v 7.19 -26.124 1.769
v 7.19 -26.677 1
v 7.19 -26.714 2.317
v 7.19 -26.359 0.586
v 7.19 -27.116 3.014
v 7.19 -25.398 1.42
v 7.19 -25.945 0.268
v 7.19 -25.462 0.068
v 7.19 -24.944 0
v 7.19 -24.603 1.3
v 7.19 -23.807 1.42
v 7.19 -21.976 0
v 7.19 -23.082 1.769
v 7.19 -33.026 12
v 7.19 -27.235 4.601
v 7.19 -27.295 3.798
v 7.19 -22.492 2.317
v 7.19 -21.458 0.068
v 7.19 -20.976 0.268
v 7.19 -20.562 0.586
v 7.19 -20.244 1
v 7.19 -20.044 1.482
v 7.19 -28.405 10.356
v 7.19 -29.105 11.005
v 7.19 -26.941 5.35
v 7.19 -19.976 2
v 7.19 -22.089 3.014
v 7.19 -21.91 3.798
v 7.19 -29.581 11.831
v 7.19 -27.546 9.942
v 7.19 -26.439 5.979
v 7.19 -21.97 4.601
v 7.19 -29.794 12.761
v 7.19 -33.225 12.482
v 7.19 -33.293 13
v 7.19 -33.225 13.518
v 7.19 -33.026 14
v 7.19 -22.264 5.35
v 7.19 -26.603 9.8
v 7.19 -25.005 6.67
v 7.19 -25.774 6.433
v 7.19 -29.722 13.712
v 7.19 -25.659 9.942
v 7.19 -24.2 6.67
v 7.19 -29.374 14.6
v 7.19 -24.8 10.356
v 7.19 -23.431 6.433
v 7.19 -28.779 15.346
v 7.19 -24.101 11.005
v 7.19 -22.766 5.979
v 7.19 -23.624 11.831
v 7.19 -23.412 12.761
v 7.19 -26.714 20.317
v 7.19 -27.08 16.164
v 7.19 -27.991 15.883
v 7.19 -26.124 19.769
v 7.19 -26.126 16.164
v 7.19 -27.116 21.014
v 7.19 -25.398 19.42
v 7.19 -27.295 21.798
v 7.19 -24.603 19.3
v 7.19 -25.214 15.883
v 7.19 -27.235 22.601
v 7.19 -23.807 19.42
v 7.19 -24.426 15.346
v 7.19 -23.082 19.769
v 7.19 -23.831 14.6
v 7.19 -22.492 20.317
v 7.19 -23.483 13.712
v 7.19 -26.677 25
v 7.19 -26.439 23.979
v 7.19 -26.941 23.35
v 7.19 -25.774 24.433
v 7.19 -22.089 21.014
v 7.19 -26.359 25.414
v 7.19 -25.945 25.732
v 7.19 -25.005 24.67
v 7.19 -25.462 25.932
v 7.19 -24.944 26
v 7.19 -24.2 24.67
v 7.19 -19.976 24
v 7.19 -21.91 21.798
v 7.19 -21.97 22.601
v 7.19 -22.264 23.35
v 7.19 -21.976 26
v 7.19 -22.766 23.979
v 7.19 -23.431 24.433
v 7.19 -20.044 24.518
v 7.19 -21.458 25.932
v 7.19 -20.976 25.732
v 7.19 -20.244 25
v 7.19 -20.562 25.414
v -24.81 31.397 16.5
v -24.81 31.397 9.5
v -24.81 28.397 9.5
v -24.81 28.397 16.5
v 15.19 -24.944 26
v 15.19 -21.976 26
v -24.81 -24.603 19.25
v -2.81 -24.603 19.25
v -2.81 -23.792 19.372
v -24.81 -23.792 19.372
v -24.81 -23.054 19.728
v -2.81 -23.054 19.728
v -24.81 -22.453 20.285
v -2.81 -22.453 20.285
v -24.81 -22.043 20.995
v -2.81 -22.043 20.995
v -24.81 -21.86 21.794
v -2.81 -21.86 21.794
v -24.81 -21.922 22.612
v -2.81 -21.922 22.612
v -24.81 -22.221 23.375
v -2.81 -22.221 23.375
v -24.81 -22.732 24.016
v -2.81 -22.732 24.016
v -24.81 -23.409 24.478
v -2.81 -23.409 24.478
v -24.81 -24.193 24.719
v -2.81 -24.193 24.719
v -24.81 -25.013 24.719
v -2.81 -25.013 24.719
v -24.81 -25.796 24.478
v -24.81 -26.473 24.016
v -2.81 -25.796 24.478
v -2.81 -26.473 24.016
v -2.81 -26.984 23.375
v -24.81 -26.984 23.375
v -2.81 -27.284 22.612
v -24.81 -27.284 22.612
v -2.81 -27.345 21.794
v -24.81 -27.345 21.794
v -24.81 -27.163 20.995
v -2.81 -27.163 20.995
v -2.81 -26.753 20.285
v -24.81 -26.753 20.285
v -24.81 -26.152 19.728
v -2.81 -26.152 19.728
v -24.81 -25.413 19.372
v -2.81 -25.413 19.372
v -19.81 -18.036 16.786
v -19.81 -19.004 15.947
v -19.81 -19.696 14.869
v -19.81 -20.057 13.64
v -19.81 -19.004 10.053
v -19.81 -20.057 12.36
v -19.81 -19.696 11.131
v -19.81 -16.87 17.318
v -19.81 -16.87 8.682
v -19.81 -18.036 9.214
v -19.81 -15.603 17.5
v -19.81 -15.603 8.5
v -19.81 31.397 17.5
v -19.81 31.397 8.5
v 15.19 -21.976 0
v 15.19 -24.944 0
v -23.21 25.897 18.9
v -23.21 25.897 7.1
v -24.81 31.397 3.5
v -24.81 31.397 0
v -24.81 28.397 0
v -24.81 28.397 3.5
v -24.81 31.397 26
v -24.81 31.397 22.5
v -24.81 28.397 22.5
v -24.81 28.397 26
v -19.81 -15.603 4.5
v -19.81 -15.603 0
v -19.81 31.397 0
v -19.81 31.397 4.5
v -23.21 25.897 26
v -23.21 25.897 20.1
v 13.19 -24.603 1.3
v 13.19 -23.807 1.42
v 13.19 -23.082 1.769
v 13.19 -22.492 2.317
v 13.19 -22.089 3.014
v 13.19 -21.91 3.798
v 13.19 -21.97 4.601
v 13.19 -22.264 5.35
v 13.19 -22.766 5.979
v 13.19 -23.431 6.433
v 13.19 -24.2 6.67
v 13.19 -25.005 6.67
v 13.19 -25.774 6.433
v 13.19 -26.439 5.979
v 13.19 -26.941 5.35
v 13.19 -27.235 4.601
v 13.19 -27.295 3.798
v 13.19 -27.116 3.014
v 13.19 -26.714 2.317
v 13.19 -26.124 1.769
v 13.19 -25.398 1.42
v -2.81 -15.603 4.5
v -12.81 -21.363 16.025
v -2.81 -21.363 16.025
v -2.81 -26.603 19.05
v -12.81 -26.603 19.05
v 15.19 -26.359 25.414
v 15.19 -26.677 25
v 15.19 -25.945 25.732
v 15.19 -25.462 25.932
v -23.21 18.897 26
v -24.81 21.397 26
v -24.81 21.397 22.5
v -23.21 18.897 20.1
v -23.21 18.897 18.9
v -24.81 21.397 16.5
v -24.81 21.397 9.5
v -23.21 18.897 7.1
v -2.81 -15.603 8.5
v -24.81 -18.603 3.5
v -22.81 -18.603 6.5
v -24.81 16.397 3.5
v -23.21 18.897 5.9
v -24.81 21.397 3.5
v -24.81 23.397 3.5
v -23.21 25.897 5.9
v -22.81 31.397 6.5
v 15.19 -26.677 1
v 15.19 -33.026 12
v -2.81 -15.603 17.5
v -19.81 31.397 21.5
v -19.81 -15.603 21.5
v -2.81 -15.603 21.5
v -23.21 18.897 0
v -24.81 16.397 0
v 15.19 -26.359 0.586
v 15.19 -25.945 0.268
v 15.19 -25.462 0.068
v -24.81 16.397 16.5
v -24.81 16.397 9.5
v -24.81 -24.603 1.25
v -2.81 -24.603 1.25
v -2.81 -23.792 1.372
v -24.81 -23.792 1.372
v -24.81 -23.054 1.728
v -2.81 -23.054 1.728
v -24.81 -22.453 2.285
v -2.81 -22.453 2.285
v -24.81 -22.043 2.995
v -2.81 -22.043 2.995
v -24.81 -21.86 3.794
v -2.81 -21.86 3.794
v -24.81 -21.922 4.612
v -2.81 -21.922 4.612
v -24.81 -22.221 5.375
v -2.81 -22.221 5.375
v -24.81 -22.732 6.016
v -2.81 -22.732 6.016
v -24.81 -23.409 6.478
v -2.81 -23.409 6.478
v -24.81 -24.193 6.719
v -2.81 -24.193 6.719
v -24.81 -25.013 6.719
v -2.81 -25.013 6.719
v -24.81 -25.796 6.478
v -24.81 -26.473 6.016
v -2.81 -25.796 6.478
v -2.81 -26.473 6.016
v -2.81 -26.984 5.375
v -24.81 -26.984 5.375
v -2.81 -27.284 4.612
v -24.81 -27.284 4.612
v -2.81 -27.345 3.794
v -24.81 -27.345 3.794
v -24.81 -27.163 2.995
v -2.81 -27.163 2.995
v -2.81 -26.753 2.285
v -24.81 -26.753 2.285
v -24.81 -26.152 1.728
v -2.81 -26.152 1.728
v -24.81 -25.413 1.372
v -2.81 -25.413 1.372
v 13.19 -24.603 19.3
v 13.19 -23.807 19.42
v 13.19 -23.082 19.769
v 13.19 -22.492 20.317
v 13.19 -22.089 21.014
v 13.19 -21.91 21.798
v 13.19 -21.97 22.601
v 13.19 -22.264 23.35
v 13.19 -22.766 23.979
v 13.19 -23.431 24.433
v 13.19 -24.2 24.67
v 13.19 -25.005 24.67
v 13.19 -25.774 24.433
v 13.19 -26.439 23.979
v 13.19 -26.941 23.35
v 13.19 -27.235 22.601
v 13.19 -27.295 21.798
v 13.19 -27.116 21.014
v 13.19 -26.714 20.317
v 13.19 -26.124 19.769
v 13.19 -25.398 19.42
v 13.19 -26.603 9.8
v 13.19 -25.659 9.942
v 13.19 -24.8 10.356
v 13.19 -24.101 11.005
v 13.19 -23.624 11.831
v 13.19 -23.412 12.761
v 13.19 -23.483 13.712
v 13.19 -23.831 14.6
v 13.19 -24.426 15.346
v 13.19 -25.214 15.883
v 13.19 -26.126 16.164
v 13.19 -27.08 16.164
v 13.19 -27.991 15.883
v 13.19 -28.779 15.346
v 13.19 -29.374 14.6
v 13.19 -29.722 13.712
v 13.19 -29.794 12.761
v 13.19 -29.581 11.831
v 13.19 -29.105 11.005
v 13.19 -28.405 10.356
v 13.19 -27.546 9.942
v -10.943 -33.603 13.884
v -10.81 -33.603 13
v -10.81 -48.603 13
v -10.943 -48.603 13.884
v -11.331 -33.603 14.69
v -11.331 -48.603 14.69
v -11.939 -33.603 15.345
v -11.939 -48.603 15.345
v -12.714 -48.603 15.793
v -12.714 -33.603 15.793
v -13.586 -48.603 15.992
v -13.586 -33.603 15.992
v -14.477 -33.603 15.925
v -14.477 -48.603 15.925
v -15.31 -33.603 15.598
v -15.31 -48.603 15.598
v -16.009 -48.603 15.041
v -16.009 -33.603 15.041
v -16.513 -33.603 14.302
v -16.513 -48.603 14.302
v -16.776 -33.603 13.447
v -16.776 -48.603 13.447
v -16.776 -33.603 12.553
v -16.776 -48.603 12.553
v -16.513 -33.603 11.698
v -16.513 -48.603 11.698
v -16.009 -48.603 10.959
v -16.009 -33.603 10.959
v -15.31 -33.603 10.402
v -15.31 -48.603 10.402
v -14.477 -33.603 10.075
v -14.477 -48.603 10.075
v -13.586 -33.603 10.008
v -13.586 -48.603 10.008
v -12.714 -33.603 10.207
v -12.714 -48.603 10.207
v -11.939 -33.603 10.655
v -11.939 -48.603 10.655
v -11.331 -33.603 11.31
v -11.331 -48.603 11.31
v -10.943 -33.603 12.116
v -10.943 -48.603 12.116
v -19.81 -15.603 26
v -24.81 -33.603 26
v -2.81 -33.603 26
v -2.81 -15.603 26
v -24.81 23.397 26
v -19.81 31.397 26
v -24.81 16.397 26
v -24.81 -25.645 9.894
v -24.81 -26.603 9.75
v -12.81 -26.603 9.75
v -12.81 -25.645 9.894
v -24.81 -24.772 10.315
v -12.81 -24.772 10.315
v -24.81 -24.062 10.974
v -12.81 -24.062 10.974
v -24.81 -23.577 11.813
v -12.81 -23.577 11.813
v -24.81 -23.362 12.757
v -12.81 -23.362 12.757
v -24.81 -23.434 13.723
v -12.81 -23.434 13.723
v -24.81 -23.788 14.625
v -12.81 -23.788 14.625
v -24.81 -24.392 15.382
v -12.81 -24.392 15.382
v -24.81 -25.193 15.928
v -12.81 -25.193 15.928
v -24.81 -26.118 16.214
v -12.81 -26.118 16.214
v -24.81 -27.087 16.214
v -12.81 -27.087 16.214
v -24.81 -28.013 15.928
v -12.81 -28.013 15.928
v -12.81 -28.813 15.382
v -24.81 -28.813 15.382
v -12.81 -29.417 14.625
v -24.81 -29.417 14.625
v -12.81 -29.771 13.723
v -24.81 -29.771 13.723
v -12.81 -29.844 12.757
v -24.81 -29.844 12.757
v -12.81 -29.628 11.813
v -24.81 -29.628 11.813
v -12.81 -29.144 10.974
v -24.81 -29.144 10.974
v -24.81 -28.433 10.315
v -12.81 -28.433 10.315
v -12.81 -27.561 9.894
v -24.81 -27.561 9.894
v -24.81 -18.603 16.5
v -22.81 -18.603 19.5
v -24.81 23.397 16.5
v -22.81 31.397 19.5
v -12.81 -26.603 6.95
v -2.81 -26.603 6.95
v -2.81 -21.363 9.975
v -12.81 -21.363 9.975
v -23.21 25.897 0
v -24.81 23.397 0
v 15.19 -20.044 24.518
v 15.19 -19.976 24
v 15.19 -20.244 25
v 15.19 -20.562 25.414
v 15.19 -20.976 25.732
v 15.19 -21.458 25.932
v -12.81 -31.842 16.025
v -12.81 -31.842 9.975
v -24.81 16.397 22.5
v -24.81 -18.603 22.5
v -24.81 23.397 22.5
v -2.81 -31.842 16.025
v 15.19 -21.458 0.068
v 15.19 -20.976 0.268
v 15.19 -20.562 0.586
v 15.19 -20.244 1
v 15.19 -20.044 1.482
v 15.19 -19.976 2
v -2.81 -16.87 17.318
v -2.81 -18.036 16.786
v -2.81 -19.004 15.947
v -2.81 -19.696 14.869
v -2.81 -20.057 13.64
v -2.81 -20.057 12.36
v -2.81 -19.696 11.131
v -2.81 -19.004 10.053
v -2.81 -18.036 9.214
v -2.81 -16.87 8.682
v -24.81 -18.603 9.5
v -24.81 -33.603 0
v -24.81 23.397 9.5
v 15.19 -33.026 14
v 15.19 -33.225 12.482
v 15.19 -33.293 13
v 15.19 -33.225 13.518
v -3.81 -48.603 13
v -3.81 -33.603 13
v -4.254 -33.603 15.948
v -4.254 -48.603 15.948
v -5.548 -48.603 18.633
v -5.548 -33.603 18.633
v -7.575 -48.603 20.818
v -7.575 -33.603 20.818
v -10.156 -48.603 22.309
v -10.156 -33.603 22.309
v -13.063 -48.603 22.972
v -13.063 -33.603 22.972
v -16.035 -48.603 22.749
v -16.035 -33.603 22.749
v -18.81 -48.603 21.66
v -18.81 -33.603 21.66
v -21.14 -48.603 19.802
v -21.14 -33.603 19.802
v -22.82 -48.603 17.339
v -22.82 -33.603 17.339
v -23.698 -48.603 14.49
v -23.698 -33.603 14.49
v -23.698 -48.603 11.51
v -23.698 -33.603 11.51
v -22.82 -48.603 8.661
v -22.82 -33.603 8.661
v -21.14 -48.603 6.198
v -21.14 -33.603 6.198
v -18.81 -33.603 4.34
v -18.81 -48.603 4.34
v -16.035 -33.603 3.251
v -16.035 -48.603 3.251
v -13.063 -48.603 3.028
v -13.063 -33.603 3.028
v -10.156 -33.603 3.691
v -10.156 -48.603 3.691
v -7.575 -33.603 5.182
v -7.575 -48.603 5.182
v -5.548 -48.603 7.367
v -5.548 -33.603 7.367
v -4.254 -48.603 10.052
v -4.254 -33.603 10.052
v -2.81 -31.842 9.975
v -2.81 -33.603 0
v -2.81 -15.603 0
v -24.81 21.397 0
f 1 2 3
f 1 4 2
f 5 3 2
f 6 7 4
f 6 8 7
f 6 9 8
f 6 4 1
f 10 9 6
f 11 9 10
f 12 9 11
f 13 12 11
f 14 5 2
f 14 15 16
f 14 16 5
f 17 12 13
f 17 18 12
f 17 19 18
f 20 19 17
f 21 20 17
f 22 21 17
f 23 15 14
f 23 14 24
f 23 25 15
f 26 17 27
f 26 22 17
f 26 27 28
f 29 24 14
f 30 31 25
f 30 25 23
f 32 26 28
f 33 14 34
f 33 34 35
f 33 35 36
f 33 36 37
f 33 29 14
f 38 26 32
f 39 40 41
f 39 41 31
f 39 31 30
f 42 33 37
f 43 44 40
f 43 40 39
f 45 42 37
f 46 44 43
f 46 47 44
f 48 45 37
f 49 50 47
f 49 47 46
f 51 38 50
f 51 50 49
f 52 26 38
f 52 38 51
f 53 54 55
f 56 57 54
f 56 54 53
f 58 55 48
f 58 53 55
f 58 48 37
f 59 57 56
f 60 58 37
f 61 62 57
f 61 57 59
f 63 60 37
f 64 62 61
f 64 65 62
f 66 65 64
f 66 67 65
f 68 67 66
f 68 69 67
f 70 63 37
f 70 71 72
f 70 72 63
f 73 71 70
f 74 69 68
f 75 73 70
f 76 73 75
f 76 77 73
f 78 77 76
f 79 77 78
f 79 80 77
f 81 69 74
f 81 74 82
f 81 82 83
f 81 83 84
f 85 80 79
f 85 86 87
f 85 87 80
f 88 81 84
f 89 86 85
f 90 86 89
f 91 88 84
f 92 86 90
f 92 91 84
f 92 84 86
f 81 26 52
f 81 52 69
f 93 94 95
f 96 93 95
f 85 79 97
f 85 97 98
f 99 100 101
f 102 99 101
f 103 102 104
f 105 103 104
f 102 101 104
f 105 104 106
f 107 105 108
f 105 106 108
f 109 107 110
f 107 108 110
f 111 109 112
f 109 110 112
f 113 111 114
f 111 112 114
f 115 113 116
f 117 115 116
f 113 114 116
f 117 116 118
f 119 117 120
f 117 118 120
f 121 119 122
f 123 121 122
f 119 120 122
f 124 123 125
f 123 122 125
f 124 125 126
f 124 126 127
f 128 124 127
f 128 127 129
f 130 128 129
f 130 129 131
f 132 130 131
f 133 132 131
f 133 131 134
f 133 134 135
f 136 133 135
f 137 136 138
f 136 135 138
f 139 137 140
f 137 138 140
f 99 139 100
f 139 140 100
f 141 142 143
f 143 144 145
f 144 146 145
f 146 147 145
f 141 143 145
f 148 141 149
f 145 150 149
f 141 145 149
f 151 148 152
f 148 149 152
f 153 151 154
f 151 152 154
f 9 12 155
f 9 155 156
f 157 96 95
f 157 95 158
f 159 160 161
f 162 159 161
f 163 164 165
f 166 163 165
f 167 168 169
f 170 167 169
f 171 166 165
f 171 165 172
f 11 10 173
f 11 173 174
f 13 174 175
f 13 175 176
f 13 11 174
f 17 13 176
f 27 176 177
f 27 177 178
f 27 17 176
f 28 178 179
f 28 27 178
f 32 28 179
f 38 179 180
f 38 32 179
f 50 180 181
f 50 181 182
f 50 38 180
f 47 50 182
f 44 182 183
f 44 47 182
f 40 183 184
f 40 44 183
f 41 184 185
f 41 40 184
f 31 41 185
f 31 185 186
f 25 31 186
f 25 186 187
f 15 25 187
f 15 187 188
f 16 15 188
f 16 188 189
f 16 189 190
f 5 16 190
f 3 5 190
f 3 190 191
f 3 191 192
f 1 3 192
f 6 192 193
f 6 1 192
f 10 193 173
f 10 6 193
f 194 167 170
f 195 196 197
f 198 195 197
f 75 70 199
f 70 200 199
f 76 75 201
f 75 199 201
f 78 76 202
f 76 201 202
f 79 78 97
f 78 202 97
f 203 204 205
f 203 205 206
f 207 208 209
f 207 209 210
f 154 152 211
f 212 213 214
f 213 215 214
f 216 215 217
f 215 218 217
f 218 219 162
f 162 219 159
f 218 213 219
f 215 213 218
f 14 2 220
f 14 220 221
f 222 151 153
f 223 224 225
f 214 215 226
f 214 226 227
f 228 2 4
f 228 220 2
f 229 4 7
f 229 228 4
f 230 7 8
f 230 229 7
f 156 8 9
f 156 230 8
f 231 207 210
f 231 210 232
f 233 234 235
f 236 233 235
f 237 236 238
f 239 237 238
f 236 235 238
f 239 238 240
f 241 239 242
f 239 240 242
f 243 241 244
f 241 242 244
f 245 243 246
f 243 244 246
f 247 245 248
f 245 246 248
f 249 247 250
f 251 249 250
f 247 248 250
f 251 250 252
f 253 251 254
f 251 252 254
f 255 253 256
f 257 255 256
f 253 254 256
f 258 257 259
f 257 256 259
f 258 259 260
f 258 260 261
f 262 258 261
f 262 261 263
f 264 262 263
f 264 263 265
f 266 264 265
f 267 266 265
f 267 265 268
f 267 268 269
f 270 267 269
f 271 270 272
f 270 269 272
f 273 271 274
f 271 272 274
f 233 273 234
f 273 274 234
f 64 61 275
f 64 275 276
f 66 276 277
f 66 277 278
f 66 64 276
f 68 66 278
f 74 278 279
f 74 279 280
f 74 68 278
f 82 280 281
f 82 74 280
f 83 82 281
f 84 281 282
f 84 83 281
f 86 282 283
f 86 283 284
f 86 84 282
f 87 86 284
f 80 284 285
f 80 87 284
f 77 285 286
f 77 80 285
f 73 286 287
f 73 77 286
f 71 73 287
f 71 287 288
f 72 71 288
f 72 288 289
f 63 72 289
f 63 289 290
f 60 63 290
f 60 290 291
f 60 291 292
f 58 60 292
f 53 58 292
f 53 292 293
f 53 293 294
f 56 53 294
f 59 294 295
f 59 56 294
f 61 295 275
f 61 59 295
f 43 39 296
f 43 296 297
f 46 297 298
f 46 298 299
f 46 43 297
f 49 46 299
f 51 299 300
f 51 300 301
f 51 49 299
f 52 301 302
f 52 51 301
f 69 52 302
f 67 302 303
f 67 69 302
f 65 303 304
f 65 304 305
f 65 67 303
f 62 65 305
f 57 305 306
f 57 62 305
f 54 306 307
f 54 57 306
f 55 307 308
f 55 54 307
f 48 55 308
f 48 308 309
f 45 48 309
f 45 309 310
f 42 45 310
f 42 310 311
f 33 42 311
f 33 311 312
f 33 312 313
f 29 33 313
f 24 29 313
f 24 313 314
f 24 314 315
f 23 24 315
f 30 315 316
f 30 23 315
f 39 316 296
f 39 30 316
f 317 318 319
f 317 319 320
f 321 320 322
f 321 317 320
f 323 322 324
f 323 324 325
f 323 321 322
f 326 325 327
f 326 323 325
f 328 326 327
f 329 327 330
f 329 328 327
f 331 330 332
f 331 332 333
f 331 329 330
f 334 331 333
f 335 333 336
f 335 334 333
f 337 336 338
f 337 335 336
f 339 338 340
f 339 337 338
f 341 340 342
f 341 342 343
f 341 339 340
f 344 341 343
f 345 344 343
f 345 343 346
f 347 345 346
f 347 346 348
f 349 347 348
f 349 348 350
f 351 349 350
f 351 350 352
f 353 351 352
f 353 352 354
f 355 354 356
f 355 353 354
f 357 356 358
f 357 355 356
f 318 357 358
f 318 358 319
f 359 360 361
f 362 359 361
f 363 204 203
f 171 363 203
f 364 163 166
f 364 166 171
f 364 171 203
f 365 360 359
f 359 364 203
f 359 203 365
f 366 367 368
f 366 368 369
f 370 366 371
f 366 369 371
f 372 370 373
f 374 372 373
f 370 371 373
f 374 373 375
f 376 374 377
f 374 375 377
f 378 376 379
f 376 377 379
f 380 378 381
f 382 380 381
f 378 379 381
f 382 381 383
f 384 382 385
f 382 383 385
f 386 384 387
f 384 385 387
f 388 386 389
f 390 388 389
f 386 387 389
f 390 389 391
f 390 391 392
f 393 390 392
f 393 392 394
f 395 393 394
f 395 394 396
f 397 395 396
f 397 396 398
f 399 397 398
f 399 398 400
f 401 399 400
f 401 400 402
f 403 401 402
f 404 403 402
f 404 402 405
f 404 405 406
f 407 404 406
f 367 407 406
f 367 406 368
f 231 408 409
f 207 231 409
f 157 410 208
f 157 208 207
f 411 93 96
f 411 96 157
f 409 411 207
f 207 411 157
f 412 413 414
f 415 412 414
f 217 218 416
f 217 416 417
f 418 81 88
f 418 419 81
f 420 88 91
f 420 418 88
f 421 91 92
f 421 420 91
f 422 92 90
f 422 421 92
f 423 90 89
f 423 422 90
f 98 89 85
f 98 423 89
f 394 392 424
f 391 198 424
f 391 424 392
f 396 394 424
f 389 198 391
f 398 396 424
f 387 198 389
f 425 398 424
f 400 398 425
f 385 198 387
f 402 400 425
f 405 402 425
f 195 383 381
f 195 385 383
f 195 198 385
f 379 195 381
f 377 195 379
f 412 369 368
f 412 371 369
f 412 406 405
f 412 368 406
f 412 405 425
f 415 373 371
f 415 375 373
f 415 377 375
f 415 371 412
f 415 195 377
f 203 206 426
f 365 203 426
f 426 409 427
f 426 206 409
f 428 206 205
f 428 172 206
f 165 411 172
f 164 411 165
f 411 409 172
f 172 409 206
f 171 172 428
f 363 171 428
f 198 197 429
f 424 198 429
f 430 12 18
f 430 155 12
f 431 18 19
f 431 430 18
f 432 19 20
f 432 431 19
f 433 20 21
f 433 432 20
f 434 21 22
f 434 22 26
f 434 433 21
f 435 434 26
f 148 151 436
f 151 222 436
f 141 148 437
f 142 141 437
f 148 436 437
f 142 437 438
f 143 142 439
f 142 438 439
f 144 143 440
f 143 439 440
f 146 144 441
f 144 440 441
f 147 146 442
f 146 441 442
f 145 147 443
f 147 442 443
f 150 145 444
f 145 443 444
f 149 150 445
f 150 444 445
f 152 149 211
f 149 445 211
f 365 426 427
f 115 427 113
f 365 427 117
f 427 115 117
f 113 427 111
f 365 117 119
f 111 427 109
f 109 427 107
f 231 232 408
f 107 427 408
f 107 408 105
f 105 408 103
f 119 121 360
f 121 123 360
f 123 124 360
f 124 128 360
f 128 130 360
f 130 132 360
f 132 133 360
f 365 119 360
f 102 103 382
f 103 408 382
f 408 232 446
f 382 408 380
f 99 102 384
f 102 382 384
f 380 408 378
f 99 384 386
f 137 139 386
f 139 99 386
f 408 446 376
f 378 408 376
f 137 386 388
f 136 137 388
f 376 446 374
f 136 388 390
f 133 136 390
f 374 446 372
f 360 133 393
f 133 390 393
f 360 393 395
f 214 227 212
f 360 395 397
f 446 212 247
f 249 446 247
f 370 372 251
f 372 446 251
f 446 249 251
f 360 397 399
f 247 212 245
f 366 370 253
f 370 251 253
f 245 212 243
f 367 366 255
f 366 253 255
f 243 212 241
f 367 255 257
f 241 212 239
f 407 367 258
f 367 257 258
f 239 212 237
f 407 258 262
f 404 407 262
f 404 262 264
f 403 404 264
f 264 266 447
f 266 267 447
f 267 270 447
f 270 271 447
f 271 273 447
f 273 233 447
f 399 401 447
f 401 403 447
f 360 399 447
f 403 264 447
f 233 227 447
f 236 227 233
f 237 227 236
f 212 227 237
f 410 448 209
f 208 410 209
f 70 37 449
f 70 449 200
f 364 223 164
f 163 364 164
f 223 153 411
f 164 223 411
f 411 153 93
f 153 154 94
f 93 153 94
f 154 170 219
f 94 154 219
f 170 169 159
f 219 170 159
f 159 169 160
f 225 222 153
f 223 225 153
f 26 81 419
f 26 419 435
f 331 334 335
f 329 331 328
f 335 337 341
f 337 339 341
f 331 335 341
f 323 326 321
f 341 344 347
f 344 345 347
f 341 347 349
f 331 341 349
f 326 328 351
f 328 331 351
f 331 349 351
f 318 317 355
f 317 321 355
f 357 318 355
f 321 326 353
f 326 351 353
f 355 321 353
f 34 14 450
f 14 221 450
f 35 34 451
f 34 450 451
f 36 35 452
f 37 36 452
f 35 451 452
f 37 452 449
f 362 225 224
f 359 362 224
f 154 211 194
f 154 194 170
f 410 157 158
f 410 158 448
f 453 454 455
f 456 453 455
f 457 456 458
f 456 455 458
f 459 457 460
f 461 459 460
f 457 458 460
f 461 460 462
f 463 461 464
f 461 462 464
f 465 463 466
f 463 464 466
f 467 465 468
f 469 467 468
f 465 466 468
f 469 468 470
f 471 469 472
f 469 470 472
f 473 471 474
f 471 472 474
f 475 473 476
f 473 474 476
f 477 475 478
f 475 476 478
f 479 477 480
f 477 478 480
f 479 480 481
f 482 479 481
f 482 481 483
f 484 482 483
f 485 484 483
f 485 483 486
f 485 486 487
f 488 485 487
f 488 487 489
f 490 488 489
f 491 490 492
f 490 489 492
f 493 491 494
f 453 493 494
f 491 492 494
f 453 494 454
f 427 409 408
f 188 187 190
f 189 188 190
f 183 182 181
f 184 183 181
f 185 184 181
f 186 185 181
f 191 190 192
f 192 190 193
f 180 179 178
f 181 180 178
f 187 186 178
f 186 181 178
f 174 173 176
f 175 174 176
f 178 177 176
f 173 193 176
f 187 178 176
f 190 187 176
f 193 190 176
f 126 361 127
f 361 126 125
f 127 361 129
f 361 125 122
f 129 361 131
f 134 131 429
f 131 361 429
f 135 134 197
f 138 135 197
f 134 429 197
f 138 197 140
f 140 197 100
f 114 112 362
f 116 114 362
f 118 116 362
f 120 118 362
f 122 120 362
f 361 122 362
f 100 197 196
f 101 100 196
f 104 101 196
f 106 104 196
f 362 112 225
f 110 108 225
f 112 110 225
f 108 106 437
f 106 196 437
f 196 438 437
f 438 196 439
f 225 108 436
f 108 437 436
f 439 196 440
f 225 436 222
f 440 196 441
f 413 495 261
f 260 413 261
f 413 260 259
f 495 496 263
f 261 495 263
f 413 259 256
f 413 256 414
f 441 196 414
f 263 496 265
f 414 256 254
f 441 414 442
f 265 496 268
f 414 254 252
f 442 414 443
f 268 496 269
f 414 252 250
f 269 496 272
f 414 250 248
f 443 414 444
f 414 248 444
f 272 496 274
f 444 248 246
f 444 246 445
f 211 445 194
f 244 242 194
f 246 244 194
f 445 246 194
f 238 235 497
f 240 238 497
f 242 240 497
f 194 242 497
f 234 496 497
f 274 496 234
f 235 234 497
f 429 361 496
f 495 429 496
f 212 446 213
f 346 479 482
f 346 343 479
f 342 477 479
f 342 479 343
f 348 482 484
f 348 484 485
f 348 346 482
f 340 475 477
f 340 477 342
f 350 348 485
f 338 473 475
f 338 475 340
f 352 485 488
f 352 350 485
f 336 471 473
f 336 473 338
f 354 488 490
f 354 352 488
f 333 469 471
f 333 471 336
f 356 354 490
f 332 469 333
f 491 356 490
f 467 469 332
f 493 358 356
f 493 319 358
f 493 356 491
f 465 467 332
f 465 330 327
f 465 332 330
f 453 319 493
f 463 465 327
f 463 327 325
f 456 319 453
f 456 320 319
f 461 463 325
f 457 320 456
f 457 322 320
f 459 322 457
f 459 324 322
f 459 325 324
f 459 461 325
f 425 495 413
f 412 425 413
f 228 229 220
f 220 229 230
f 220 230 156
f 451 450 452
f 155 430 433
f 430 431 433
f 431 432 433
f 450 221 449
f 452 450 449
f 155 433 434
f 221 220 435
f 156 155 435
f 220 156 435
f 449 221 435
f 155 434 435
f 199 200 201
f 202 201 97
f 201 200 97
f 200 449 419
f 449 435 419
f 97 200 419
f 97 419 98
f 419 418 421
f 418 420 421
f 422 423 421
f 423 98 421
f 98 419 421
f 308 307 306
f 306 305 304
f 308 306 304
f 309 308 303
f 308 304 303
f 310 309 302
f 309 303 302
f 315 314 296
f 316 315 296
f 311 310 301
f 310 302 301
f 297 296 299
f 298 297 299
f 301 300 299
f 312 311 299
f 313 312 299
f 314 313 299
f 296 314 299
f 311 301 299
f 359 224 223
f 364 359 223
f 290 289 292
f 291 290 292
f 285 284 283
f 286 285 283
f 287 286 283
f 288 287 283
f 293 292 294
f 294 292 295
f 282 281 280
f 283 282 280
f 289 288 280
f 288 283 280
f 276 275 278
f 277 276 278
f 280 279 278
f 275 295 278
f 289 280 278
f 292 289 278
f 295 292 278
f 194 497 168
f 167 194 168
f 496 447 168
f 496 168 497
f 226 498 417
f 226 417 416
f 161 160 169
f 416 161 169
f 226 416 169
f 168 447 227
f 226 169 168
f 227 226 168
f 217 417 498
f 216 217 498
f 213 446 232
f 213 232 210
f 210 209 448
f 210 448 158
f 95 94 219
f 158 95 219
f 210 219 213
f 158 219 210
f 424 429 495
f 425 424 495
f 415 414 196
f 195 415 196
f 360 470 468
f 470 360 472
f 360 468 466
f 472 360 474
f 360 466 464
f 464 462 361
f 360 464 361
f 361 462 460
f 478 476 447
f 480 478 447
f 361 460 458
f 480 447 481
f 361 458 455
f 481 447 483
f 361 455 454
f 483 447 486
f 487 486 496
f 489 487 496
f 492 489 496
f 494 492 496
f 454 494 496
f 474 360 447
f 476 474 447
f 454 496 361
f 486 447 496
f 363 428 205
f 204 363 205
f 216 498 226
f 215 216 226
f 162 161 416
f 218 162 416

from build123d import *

# Parameters (mm, degrees)
SALIENTE_EXTRUIR1_DEPTH = 26
CROQUIS15_R             = 3.25
CORTAR_EXTRUIR5_DEPTH   = 28
SALIENTE_EXTRUIR3_DEPTH = 2
CROQUIS9_R              = 4.5
CORTAR_EXTRUIR1_DEPTH   = 17
CROQUIS10_R             = 2.75
CORTAR_EXTRUIR2_DEPTH   = 22
CORTAR_EXTRUIR3_DEPTH   = 50
SALIENTE_EXTRUIR5_DEPTH = 8
REDONDEO2_R             = 2
REDONDEO3_R             = 2
CROQUIS18_R             = 2.7
CROQUIS18_R_2           = 3.2
CORTAR_EXTRUIR6_DEPTH   = 6
CROQUIS19_R             = 10
CROQUIS19_R_2           = 3
SALIENTE_EXTRUIR6_DEPTH = 15
CORTAR_EXTRUIR7_DEPTH   = 10


with BuildPart() as part:
    # Croquis1 → Saliente-Extruir1 (new body)
    with BuildSketch(Plane.XY):
        Polygon((-24.80990609, 23.397347273), (-24.80990609, 21.397347273), (-23.20990609, 18.897347273), (-24.80990609, 16.397347273), (-24.80990609, -33.602652727), (-2.80990609, -33.602652727), (-2.80990609, -15.602652727), (-19.80990609, -15.602652727), (-19.80990609, 31.397347273), (-24.80990609, 31.397347273), (-24.80990609, 28.397347273), (-23.20990609, 25.897347273), align=None)
    extrude(amount=SALIENTE_EXTRUIR1_DEPTH)

    # Croquis15 → Cortar-Extruir5 (cut)
    with BuildSketch(Plane(origin=(-2.80990609, 0, 0), x_dir=(0, 0, -1), z_dir=(1, 0, 0))):
        with Locations((-13, -26.602652727)):
            Circle(CROQUIS15_R)
    extrude(amount=-CORTAR_EXTRUIR5_DEPTH, mode=Mode.SUBTRACT)

    # Croquis8 → Saliente-Extruir3 (add, symmetric)
    with BuildSketch(Plane(origin=(0, 0, 19.5), x_dir=(-1, 0, 0), z_dir=(0, 0, -1))):
        Polygon((19.80990609, 31.397347273), (19.80990609, -15.602652727), (2.80990609, -15.602652727), align=None)
    saliente_extruir3 = extrude(amount=SALIENTE_EXTRUIR3_DEPTH, both=True)

    # Simetría1: Saliente-Extruir3 across plane
    add(saliente_extruir3.mirror(Plane(origin=(0, 0, 13), x_dir=(1, 0, 0), z_dir=(0, 0, -1))))

    # Croquis9 → Cortar-Extruir1 (cut)
    with BuildSketch(Plane(origin=(-2.80990609, 0, 0), x_dir=(0, 0, -1), z_dir=(1, 0, 0))):
        with Locations((-13, -15.602652727)):
            Circle(CROQUIS9_R)
    extrude(amount=-CORTAR_EXTRUIR1_DEPTH, mode=Mode.SUBTRACT)

    # Croquis10 → Cortar-Extruir2 (cut)
    with BuildSketch(Plane(origin=(-2.80990609, 0, 0), x_dir=(0, 0, -1), z_dir=(1, 0, 0))):
        with Locations((-22, -24.602652727)):
            Circle(CROQUIS10_R)
        with Locations((-4, -24.602652727)):
            Circle(CROQUIS10_R)
    extrude(amount=-CORTAR_EXTRUIR2_DEPTH, mode=Mode.SUBTRACT)

    # Croquis12 → Cortar-Extruir3 (cut)
    with BuildSketch(Plane(origin=(0, 31.397347273, 0), x_dir=(1, 0, 0), z_dir=(0, 1, 0))):
        Polygon((-24.80990609, -22.5), (-24.80990609, -16.5), (-22.80990609, -19.5), align=None)
        Polygon((-22.80990609, -6.5), (-24.80990609, -3.5), (-24.80990609, -9.5), align=None)
    extrude(amount=-CORTAR_EXTRUIR3_DEPTH, mode=Mode.SUBTRACT)

    # Croquis19 → Saliente-Extruir6 (add)
    with BuildSketch(Plane.XZ.offset(33.602652727)):
        with Locations((-13.80990609, 13)):
            Circle(CROQUIS19_R)
        with Locations((-13.80990609, 13)):
            Circle(CROQUIS19_R_2, mode=Mode.SUBTRACT)
    extrude(amount=SALIENTE_EXTRUIR6_DEPTH)

    # Croquis21 → Cortar-Extruir7 (cut)
    with BuildSketch(Plane(origin=(-2.80990609, 0, 0), x_dir=(0, 0, -1), z_dir=(1, 0, 0))):
        Polygon((-9.975, -21.363199034), (-16.025, -21.363199034), (-19.05, -26.602652727), (-16.025, -31.84210642), (-9.975, -31.84210642), (-6.95, -26.602652727), align=None)
    extrude(amount=-CORTAR_EXTRUIR7_DEPTH, mode=Mode.SUBTRACT)


with BuildPart() as body_2:
    # Croquis17 → Saliente-Extruir5 (new body)
    with BuildSketch(Plane(origin=(7.19009391, 0, 0), x_dir=(0, 0, -1), z_dir=(1, 0, 0))):
        Polygon((-26, -19.976130017), (0, -19.976130017), (0, -26.099358276), (-13, -33.602652727), (-26, -26.099358276), align=None)
    extrude(amount=SALIENTE_EXTRUIR5_DEPTH)

    # Redondeo2
    redondeo2_edges = [body_2.edges().sort_by_distance(p)[0] for p in [
        (11.19009391, -33.602652727, 13),
    ]]
    fillet(redondeo2_edges, radius=REDONDEO2_R)

    # Redondeo3
    redondeo3_edges = [body_2.edges().sort_by_distance(p)[0] for p in [
        (11.19009391, -19.976130017, 26),
        (11.19009391, -19.976130017, 0),
        (11.19009391, -26.099358276, 0),
        (11.19009391, -26.099358276, 26),
    ]]
    fillet(redondeo3_edges, radius=REDONDEO3_R)

    # Croquis18 → Cortar-Extruir6 (cut)
    with BuildSketch(Plane(origin=(7.19009391, 0, 0), x_dir=(0, 0, -1), z_dir=(1, 0, 0))):
        with Locations((-22, -24.602652727)):
            Circle(CROQUIS18_R)
        with Locations((-13, -26.602652727)):
            Circle(CROQUIS18_R_2)
        with Locations((-4, -24.602652727)):
            Circle(CROQUIS18_R)
    extrude(amount=CORTAR_EXTRUIR6_DEPTH, mode=Mode.SUBTRACT)


solid = Compound([part.part, body_2.part])
